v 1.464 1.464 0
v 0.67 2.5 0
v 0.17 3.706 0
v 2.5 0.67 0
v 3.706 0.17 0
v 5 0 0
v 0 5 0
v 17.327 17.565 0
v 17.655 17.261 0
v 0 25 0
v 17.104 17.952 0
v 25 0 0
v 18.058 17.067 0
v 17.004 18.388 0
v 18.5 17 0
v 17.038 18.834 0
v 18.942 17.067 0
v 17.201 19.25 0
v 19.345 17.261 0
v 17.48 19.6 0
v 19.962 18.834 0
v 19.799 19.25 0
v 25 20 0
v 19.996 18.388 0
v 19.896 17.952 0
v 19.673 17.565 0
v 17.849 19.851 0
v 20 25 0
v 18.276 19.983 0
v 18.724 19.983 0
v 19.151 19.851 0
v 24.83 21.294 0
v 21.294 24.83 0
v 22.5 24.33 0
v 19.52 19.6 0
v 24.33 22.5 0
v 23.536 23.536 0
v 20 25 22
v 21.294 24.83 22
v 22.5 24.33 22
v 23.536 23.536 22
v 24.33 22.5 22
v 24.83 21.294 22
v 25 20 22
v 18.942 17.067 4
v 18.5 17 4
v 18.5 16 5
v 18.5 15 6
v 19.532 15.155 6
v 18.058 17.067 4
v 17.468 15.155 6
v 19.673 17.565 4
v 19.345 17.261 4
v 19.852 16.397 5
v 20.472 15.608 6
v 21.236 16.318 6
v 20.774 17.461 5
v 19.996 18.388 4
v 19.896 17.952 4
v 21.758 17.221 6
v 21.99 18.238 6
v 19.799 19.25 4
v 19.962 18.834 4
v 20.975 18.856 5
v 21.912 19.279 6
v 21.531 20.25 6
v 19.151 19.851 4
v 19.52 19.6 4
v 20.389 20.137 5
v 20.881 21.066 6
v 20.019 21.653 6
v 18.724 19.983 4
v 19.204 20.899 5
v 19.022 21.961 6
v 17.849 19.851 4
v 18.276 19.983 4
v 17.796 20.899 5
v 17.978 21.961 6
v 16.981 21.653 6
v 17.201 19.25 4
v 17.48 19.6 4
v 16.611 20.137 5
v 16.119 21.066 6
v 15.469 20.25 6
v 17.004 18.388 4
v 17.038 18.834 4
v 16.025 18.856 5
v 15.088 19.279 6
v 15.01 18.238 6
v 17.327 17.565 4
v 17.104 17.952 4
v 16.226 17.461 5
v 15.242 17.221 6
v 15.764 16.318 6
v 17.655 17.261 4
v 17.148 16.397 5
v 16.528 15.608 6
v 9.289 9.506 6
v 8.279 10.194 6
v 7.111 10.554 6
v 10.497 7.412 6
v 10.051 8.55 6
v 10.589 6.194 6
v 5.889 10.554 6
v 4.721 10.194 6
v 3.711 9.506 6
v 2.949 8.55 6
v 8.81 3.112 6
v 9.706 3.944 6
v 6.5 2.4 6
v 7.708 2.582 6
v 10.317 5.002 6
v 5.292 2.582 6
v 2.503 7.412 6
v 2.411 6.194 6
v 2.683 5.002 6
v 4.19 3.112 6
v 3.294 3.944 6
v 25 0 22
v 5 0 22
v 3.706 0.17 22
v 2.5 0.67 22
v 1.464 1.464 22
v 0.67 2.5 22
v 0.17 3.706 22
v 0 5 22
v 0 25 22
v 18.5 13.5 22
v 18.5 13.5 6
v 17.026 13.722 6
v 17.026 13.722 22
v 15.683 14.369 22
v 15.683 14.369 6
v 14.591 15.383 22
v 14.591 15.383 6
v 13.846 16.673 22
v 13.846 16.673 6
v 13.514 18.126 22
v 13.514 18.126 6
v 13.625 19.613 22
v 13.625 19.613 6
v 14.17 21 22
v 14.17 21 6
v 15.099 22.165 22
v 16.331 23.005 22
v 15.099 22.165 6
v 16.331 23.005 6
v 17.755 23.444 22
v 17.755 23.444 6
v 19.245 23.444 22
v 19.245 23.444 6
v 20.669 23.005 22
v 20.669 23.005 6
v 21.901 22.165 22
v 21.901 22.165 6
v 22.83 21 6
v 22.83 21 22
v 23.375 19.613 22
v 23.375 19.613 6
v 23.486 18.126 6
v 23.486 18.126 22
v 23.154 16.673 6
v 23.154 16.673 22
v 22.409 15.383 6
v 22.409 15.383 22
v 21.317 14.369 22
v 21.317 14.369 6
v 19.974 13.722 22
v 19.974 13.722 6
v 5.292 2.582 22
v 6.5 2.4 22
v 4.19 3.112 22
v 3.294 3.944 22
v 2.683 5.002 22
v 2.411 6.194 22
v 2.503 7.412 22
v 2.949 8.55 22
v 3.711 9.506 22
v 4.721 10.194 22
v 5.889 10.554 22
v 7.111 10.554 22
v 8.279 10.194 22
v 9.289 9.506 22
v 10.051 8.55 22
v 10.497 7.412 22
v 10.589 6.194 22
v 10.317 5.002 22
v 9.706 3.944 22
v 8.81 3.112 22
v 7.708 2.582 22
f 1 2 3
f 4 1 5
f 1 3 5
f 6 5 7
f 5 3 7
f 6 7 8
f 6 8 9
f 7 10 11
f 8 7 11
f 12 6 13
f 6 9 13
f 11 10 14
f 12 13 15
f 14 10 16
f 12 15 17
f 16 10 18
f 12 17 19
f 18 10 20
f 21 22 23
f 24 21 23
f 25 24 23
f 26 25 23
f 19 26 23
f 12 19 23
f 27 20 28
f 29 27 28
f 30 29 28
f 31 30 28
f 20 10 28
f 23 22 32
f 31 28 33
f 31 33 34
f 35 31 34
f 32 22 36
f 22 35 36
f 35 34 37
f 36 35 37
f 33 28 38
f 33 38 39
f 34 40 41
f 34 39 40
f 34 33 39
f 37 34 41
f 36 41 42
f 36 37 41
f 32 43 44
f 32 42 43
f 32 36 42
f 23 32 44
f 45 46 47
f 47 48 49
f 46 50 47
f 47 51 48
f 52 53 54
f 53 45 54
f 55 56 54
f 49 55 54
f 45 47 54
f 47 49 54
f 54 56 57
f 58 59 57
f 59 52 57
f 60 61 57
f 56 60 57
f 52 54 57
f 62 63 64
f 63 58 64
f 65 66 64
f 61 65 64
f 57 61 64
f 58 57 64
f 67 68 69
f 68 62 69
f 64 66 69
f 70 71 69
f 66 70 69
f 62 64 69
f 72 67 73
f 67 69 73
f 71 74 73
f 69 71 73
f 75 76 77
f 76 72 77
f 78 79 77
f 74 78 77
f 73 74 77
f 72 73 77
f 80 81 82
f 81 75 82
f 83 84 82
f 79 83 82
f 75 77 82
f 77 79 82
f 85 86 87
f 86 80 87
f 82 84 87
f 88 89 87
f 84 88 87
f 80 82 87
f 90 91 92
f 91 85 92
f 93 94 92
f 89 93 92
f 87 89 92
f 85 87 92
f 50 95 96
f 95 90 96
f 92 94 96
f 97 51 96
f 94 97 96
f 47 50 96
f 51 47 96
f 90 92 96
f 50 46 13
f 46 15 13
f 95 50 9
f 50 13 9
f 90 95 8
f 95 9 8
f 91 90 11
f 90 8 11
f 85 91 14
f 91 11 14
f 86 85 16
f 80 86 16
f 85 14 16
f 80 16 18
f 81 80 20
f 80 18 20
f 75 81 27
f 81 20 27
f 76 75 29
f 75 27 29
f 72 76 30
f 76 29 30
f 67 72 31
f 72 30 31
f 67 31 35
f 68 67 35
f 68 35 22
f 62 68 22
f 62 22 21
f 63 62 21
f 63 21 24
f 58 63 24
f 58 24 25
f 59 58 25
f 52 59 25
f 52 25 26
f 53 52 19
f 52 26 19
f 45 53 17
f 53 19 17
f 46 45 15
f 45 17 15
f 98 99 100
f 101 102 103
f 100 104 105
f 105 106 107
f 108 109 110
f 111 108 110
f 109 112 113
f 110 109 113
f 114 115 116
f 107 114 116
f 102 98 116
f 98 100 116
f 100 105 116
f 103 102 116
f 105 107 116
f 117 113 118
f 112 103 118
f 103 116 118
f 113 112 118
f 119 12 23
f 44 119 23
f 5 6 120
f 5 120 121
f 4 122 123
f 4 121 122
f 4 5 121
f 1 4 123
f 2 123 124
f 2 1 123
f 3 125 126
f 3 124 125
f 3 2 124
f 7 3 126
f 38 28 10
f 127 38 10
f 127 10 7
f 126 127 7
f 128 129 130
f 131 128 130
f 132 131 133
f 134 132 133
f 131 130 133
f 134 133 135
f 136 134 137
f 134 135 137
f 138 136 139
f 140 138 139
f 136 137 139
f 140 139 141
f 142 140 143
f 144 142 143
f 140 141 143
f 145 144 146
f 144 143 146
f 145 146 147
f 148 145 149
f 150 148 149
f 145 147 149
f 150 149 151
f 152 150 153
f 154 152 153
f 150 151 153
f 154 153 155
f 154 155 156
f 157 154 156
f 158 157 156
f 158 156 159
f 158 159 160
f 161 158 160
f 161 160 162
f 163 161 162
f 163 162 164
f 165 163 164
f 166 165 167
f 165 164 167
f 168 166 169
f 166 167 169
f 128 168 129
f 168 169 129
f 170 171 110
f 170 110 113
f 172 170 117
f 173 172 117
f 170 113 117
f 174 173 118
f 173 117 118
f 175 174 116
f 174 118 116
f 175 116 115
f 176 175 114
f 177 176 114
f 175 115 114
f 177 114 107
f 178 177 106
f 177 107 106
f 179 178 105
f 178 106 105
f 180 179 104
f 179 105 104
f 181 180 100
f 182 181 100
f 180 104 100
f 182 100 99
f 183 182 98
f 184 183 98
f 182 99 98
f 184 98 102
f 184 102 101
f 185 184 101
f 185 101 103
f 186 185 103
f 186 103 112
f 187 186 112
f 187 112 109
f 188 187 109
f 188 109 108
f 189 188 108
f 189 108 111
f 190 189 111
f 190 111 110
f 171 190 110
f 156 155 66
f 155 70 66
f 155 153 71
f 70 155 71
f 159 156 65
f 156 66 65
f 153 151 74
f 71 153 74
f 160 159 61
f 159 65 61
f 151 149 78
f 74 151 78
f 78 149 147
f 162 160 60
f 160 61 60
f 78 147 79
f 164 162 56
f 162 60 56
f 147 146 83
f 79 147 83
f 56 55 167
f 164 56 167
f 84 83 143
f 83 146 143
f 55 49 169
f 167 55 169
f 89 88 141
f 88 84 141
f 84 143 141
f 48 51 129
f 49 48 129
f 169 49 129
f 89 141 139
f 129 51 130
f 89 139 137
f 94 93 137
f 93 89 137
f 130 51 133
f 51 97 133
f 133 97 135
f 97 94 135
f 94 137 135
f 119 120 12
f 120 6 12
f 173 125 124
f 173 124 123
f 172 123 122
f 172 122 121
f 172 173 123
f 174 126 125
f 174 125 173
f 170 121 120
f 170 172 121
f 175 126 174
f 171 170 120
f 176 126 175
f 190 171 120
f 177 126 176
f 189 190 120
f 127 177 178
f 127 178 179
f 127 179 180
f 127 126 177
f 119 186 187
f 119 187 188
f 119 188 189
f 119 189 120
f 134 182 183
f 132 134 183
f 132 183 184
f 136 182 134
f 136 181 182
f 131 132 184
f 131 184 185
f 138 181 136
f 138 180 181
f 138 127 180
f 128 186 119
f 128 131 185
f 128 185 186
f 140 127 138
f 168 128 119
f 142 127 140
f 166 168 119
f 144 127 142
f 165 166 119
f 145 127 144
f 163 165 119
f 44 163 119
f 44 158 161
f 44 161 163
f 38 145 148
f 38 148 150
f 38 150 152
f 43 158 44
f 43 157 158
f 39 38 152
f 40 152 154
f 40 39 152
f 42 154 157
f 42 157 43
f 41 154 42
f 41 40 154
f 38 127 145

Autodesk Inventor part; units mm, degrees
ref_plane "YZ Plane" through (0, 0, 0) normal (1, 0, 0) x (0, 1, 0)
ref_plane "XZ Plane" through (0, 0, 0) normal (0, 1, 0) x (-1, 0, 0)
ref_plane "XY Plane" through (0, 0, 0) normal (0, 0, 1) x (1, 0, 0)
sketch "Sketch1" plane through (0, 0, 0) normal (0, 0, 1) x (1, 0, 0)
  line L0 (5, 0) -> (25, 0)
  line L1 (25, 0) -> (25, 20)
  line L2 (20, 25) -> (0, 25)
  line L3 (0, 25) -> (0, 5)
  arc A0 (25, 20) -> (20, 25) centre (20, 20) ccw
  arc A1 (0, 5) -> (5, 0) centre (5, 5) ccw
  point P0 (0, 0)
  point P1 (25, 25)
  dimension "d0" = 25
  dimension "d1" = 25
  dimension "d2" = 5
  dimension "d29" = 5
extrude "Extrusion1" add sketch "Sketch1" along normal blind 22
sketch "Sketch2" plane through (0, 0, 22) normal (0, 0, 1) x (1, 0, 0)
  line L0 (20, 25) -> (0, 25) projected
  line L1 (25, 0) -> (25, 20) projected
  point P0 (0, 0)
  point P1 (18.5, 18.5)
  dimension "d12" = 6.5
  dimension "d13" = 6.5
hole "Hole1" at (18.5, 18.5, 22) direction (0, 0, -1) diameter 10 depth 16
sketch "Sketch3" plane through (18.5, 18.5, 6) normal (0, 0, 1) x (1, 0, 0)
  line L0 (6.5, -18.5) -> (6.5, 1.5) projected
  line L1 (1.5, 6.5) -> (-18.5, 6.5) projected
  point P0 (-18.5, -18.5)
  point P1 (0, 0)
  dimension "d21" = 6.5
  dimension "d22" = 6.5
hole "Hole2" at (18.5, 18.5, 6) direction (0, 0, -1) diameter 3 depth 15
chamfer "Chamfer2" distance 2 angle 45 1 edges at (18.5, 20, 6)
sketch "Sketch4" plane through (0, 0, 22) normal (0, 0, 1) x (1, 0, 0)
  line L0 (5, 0) -> (25, 0) projected
  line L1 (0, 25) -> (0, 5) projected
  point P0 (0, 0)
  point P1 (6.5, 6.5)
  dimension "d37" = 6.5
  dimension "d38" = 6.5
hole "Hole3" at (6.5, 6.5, 22) direction (0, 0, -1) diameter 8.2 depth 16
properties part number "spacer dubbele hoogte behuizing"
